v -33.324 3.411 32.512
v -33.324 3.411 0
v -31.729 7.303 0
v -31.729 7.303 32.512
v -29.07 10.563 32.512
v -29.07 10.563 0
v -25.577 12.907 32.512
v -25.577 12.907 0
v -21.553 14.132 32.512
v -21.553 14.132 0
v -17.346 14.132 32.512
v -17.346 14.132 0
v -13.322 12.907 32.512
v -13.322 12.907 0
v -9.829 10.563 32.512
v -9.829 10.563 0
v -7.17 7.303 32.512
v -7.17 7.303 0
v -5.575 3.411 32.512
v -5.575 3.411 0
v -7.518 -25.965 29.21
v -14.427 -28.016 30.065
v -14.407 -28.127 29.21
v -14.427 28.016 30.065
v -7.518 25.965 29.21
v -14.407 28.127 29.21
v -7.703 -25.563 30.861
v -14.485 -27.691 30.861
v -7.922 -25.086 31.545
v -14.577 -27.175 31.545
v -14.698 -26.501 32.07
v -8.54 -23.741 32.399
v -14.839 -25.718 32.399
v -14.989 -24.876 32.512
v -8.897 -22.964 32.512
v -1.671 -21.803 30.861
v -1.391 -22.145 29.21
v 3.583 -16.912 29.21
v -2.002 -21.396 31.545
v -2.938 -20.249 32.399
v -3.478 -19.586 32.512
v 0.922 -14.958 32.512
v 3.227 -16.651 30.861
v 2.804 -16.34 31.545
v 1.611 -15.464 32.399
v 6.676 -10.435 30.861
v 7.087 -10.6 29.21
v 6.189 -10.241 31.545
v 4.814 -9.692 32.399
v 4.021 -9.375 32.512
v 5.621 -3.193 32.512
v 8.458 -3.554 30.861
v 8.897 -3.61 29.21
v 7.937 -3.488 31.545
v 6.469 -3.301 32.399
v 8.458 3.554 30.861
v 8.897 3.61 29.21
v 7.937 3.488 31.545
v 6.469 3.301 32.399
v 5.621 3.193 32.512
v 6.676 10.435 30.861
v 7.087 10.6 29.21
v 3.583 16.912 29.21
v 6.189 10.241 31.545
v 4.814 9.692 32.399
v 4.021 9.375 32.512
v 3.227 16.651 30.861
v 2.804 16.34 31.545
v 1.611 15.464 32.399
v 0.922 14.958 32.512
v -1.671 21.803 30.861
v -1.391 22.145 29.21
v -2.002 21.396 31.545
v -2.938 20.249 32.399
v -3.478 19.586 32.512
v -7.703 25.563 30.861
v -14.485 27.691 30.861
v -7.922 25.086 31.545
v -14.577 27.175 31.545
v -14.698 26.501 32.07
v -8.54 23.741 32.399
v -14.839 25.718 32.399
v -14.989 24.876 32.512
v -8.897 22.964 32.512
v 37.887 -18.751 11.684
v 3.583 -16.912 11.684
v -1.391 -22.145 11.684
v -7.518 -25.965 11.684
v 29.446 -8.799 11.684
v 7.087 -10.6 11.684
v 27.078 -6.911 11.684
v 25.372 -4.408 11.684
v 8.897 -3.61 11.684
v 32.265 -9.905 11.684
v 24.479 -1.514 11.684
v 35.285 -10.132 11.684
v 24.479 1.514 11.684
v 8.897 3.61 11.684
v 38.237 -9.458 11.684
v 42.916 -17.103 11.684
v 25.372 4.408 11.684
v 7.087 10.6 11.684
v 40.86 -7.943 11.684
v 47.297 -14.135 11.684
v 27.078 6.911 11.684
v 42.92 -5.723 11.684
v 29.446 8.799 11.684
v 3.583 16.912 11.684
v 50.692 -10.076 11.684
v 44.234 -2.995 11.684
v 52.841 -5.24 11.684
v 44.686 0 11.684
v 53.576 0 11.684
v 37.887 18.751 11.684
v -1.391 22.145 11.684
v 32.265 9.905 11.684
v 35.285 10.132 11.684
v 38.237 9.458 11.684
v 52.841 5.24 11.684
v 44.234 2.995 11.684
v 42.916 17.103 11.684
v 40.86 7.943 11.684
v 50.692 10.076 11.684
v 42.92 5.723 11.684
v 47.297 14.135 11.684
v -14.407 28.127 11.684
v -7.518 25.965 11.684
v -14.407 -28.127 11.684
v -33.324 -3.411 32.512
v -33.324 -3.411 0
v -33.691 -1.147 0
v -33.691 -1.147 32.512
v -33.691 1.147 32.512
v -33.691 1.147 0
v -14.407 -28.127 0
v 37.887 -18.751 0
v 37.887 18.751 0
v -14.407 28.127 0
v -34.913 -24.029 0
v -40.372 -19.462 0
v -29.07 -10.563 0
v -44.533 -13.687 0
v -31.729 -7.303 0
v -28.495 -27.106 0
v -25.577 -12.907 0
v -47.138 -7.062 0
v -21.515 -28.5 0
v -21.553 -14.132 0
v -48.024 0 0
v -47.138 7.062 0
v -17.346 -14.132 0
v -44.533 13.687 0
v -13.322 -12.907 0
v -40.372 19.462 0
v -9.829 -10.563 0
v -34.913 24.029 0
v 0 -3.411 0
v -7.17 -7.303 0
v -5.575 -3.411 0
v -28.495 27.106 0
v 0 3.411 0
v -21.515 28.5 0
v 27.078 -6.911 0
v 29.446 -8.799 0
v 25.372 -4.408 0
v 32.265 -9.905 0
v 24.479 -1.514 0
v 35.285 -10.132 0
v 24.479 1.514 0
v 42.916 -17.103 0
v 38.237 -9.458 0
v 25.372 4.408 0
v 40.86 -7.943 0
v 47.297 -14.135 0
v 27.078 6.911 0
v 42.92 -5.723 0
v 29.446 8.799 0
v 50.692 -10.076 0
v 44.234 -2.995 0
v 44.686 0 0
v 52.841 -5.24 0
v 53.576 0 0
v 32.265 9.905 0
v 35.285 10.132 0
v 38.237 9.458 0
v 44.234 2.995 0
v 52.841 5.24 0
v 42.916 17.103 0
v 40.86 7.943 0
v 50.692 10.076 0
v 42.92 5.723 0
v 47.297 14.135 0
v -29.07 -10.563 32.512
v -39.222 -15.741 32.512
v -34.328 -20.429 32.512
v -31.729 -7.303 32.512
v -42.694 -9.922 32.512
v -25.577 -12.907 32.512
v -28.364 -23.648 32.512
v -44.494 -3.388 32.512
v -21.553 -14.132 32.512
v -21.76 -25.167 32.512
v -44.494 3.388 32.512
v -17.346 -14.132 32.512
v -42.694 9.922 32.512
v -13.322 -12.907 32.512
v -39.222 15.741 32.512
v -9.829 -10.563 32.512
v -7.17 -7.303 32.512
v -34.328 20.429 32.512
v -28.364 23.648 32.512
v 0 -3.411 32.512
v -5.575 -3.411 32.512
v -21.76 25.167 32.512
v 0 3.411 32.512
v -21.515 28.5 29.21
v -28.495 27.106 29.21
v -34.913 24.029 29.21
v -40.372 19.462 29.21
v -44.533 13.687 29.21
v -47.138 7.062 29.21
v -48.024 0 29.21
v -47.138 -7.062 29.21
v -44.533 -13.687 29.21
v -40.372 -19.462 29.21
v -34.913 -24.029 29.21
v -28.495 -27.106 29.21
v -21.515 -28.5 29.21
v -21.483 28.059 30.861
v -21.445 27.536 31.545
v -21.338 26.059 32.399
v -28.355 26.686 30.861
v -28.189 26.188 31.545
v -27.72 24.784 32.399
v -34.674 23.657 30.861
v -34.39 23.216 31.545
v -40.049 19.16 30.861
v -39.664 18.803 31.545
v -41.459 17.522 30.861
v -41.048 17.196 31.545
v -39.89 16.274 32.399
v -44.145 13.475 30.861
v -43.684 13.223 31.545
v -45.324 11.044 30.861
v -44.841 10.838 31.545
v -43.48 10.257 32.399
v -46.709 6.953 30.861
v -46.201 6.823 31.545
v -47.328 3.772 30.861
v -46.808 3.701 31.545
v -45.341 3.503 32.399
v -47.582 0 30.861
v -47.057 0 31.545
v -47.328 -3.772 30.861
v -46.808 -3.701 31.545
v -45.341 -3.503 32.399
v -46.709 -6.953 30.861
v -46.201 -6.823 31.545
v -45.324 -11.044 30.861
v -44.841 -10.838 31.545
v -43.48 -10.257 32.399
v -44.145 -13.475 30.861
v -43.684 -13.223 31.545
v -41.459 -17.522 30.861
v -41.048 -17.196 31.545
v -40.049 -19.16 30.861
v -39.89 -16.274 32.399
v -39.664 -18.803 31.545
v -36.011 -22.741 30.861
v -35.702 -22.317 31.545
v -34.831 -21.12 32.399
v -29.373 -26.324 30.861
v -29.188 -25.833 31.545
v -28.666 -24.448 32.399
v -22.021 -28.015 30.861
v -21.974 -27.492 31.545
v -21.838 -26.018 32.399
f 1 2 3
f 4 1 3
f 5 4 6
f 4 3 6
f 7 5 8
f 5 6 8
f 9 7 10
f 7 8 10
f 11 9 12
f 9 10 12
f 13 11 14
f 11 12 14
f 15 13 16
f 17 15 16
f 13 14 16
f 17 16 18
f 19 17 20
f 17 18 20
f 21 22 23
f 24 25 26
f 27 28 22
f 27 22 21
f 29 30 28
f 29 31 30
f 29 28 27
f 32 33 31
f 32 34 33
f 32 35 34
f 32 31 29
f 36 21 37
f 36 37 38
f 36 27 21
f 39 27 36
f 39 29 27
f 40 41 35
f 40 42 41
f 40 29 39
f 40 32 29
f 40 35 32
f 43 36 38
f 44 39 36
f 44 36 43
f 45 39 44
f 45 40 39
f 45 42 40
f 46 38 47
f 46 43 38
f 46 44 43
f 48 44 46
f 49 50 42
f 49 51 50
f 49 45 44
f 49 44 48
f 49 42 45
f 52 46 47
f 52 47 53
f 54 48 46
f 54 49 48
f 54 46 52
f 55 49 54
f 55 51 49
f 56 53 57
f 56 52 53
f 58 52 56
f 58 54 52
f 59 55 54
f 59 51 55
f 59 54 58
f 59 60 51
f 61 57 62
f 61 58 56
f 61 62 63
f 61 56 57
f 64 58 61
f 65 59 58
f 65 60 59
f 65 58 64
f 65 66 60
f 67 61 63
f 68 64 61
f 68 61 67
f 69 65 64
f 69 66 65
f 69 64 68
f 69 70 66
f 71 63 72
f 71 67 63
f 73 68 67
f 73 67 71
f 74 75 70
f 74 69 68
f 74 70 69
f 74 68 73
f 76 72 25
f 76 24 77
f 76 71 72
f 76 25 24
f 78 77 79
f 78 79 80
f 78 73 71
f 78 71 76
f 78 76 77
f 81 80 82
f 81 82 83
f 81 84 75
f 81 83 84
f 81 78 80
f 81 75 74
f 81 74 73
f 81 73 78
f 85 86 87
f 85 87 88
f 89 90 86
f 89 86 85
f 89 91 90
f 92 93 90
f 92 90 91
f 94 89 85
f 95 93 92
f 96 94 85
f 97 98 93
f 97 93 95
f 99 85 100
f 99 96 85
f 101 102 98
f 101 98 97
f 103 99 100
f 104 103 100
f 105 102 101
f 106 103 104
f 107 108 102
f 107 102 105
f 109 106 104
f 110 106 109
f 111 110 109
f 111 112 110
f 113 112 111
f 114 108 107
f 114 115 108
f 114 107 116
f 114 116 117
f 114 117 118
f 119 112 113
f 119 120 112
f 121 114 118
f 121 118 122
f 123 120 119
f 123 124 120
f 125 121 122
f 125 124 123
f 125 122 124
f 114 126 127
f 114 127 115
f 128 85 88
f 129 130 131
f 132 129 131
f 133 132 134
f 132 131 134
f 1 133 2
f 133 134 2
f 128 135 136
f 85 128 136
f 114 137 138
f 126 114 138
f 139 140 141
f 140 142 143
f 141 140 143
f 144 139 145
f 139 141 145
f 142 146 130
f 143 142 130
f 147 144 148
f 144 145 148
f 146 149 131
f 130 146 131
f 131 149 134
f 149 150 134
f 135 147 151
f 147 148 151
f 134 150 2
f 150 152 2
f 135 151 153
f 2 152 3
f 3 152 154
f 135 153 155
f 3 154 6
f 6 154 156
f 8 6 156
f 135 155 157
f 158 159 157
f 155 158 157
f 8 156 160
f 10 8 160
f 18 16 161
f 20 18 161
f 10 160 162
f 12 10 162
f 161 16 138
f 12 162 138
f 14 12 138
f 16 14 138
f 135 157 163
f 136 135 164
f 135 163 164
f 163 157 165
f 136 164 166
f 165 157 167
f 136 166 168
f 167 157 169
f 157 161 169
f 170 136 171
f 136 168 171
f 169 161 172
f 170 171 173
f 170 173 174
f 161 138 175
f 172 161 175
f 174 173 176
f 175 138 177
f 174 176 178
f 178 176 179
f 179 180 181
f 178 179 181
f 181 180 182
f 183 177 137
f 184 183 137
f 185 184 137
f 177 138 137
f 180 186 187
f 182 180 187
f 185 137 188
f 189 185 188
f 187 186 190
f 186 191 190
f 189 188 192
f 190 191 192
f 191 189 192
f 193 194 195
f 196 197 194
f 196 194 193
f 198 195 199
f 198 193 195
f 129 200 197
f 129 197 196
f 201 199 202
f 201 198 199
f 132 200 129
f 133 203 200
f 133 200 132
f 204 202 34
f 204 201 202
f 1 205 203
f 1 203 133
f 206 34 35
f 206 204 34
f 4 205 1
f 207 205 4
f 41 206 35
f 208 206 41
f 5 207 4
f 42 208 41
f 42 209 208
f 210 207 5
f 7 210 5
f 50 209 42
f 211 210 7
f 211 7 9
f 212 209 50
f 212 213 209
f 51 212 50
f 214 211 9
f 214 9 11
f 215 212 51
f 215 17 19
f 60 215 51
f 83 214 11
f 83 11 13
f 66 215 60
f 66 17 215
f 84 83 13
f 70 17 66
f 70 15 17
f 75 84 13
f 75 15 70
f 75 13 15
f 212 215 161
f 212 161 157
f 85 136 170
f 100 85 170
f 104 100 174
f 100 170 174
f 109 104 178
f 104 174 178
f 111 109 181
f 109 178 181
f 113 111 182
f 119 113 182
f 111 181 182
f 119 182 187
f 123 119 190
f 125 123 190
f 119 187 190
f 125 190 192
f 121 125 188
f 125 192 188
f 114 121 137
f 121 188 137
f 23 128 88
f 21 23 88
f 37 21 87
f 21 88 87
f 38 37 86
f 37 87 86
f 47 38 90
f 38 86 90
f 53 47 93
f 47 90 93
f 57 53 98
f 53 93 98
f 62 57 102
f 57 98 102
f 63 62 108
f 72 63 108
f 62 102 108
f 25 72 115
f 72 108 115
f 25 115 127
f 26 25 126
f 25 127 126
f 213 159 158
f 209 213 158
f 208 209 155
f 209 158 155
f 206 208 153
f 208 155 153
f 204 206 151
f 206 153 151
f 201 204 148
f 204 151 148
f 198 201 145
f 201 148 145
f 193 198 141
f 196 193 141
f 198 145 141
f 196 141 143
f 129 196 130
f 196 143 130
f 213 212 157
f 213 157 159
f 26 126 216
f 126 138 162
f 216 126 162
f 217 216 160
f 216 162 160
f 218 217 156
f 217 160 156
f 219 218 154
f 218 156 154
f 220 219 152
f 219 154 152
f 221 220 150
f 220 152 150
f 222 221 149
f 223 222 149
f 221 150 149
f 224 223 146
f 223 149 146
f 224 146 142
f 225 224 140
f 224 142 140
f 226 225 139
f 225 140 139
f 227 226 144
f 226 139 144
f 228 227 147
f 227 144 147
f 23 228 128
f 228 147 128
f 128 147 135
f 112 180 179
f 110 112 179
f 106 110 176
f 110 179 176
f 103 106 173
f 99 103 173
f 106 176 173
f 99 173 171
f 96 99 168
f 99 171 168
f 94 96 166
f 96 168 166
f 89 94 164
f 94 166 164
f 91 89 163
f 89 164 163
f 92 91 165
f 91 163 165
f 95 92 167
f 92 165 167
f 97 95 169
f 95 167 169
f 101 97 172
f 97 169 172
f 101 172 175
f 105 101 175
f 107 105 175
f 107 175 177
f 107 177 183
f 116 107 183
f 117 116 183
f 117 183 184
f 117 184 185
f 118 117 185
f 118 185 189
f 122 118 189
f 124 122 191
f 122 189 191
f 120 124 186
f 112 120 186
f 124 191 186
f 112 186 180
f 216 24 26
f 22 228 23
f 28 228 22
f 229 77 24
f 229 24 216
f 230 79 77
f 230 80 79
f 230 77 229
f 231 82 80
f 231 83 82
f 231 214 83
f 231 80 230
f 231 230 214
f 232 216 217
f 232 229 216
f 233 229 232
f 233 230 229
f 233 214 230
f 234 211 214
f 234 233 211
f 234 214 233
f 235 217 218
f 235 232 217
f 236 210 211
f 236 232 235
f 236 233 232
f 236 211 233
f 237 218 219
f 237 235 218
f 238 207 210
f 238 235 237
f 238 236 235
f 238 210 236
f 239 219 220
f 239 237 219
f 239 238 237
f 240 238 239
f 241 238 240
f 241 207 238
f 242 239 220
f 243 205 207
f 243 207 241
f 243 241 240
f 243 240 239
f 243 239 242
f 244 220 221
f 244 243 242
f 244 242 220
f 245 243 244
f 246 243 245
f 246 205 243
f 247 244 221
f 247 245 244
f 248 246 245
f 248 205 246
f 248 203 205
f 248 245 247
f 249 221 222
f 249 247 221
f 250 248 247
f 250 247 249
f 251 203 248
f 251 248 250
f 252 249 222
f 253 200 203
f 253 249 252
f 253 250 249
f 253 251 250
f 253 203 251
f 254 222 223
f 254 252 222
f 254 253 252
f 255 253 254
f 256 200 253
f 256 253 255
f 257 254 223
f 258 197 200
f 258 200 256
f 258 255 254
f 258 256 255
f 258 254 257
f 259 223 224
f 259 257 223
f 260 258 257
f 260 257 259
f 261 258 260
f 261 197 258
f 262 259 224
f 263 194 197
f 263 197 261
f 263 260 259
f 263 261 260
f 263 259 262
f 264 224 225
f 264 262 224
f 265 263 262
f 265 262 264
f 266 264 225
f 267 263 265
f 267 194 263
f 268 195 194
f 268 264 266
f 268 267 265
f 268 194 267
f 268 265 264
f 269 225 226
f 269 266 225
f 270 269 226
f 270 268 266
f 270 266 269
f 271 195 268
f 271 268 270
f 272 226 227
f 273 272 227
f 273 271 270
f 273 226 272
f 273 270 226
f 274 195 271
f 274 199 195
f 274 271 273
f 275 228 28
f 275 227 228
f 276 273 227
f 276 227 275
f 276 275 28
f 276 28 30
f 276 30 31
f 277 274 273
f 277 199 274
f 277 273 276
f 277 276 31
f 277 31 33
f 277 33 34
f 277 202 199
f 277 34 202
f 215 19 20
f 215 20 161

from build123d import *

# Parameters (mm, degrees)
F0_R     = 24.8703157221
F1_DEPTH = 32.512
F2_DEPTH = 11.684
F3_R     = 3.302


with BuildPart() as f1:
    # F0 (on Top) → F1 (new body)
    with BuildSketch(Plane.XY):
        with BuildLine():
            ThreePointArc((-14.4067881156, -28.1265414802), (2.4665893818, -18.3362616868), (9.1255648255, 0))
            ThreePointArc((9.1255648255, 0), (2.4665893818, 18.3362616868), (-14.4067881156, 28.1265414802))
            ThreePointArc((-14.4067881156, 28.1265414802), (-48.0244351745, 0), (-14.4067881156, -28.1265414802))
        make_face()
        with Locations((-19.4494351745, 0)):
            Circle(F0_R, mode=Mode.SUBTRACT)
        with Locations((-19.4494351745, 0)):
            Circle(F0_R)
        with BuildLine():
            Line((0, 3.4105645027), (0, 0))
            Line((0, 0), (0, -3.4105645027))
            Line((0, -3.4105645027), (-5.5749728057, -3.4105645027))
            ThreePointArc((-5.5749728057, -3.4105645027), (-19.4494351745, -14.2875), (-33.3238975433, -3.4105645027))
            ThreePointArc((-33.3238975433, -3.4105645027), (-33.7369351745, 0), (-33.3238975433, 3.4105645027))
            ThreePointArc((-33.3238975433, 3.4105645027), (-19.4494351745, 14.2875), (-5.5749728057, 3.4105645027))
            Line((-5.5749728057, 3.4105645027), (0, 3.4105645027))
        make_face(mode=Mode.SUBTRACT)
    extrude(amount=F1_DEPTH)

    # F0 (on Top) → F2 (join)
    with BuildSketch(Plane.XY):
        with BuildLine():
            ThreePointArc((-14.4067881156, 28.1265414802), (2.4665893818, 18.3362616868), (9.1255648255, 0))
            ThreePointArc((9.1255648255, 0), (2.4665893818, -18.3362616868), (-14.4067881156, -28.1265414802))
            Line((-14.4067881156, -28.1265414802), (37.8873295314, -18.7510276535))
            ThreePointArc((37.8873295314, -18.7510276535), (53.5755648255, 0), (37.8873295314, 18.7510276535))
            Line((37.8873295314, 18.7510276535), (-14.4067881156, 28.1265414802))
        make_face()
        with BuildLine():
            ThreePointArc((24.3655648255, 0), (34.5255648255, 10.16), (44.6855648255, 0))
            ThreePointArc((44.6855648255, 0), (34.5255648255, -10.16), (24.3655648255, 0))
        make_face(mode=Mode.SUBTRACT)
        with BuildLine():
            ThreePointArc((-14.4067881156, -28.1265414802), (2.4665893818, -18.3362616868), (9.1255648255, 0))
            ThreePointArc((9.1255648255, 0), (2.4665893818, 18.3362616868), (-14.4067881156, 28.1265414802))
            ThreePointArc((-14.4067881156, 28.1265414802), (-48.0244351745, 0), (-14.4067881156, -28.1265414802))
        make_face()
        with Locations((-19.4494351745, 0)):
            Circle(F0_R, mode=Mode.SUBTRACT)
    extrude(amount=F2_DEPTH)

    # F3
    f3_edges = [f1.edges().sort_by_distance(p)[0] for p in [
        (-48.024435, 0, 32.512),
    ]]
    fillet(f3_edges, radius=F3_R)


solid = f1.part
